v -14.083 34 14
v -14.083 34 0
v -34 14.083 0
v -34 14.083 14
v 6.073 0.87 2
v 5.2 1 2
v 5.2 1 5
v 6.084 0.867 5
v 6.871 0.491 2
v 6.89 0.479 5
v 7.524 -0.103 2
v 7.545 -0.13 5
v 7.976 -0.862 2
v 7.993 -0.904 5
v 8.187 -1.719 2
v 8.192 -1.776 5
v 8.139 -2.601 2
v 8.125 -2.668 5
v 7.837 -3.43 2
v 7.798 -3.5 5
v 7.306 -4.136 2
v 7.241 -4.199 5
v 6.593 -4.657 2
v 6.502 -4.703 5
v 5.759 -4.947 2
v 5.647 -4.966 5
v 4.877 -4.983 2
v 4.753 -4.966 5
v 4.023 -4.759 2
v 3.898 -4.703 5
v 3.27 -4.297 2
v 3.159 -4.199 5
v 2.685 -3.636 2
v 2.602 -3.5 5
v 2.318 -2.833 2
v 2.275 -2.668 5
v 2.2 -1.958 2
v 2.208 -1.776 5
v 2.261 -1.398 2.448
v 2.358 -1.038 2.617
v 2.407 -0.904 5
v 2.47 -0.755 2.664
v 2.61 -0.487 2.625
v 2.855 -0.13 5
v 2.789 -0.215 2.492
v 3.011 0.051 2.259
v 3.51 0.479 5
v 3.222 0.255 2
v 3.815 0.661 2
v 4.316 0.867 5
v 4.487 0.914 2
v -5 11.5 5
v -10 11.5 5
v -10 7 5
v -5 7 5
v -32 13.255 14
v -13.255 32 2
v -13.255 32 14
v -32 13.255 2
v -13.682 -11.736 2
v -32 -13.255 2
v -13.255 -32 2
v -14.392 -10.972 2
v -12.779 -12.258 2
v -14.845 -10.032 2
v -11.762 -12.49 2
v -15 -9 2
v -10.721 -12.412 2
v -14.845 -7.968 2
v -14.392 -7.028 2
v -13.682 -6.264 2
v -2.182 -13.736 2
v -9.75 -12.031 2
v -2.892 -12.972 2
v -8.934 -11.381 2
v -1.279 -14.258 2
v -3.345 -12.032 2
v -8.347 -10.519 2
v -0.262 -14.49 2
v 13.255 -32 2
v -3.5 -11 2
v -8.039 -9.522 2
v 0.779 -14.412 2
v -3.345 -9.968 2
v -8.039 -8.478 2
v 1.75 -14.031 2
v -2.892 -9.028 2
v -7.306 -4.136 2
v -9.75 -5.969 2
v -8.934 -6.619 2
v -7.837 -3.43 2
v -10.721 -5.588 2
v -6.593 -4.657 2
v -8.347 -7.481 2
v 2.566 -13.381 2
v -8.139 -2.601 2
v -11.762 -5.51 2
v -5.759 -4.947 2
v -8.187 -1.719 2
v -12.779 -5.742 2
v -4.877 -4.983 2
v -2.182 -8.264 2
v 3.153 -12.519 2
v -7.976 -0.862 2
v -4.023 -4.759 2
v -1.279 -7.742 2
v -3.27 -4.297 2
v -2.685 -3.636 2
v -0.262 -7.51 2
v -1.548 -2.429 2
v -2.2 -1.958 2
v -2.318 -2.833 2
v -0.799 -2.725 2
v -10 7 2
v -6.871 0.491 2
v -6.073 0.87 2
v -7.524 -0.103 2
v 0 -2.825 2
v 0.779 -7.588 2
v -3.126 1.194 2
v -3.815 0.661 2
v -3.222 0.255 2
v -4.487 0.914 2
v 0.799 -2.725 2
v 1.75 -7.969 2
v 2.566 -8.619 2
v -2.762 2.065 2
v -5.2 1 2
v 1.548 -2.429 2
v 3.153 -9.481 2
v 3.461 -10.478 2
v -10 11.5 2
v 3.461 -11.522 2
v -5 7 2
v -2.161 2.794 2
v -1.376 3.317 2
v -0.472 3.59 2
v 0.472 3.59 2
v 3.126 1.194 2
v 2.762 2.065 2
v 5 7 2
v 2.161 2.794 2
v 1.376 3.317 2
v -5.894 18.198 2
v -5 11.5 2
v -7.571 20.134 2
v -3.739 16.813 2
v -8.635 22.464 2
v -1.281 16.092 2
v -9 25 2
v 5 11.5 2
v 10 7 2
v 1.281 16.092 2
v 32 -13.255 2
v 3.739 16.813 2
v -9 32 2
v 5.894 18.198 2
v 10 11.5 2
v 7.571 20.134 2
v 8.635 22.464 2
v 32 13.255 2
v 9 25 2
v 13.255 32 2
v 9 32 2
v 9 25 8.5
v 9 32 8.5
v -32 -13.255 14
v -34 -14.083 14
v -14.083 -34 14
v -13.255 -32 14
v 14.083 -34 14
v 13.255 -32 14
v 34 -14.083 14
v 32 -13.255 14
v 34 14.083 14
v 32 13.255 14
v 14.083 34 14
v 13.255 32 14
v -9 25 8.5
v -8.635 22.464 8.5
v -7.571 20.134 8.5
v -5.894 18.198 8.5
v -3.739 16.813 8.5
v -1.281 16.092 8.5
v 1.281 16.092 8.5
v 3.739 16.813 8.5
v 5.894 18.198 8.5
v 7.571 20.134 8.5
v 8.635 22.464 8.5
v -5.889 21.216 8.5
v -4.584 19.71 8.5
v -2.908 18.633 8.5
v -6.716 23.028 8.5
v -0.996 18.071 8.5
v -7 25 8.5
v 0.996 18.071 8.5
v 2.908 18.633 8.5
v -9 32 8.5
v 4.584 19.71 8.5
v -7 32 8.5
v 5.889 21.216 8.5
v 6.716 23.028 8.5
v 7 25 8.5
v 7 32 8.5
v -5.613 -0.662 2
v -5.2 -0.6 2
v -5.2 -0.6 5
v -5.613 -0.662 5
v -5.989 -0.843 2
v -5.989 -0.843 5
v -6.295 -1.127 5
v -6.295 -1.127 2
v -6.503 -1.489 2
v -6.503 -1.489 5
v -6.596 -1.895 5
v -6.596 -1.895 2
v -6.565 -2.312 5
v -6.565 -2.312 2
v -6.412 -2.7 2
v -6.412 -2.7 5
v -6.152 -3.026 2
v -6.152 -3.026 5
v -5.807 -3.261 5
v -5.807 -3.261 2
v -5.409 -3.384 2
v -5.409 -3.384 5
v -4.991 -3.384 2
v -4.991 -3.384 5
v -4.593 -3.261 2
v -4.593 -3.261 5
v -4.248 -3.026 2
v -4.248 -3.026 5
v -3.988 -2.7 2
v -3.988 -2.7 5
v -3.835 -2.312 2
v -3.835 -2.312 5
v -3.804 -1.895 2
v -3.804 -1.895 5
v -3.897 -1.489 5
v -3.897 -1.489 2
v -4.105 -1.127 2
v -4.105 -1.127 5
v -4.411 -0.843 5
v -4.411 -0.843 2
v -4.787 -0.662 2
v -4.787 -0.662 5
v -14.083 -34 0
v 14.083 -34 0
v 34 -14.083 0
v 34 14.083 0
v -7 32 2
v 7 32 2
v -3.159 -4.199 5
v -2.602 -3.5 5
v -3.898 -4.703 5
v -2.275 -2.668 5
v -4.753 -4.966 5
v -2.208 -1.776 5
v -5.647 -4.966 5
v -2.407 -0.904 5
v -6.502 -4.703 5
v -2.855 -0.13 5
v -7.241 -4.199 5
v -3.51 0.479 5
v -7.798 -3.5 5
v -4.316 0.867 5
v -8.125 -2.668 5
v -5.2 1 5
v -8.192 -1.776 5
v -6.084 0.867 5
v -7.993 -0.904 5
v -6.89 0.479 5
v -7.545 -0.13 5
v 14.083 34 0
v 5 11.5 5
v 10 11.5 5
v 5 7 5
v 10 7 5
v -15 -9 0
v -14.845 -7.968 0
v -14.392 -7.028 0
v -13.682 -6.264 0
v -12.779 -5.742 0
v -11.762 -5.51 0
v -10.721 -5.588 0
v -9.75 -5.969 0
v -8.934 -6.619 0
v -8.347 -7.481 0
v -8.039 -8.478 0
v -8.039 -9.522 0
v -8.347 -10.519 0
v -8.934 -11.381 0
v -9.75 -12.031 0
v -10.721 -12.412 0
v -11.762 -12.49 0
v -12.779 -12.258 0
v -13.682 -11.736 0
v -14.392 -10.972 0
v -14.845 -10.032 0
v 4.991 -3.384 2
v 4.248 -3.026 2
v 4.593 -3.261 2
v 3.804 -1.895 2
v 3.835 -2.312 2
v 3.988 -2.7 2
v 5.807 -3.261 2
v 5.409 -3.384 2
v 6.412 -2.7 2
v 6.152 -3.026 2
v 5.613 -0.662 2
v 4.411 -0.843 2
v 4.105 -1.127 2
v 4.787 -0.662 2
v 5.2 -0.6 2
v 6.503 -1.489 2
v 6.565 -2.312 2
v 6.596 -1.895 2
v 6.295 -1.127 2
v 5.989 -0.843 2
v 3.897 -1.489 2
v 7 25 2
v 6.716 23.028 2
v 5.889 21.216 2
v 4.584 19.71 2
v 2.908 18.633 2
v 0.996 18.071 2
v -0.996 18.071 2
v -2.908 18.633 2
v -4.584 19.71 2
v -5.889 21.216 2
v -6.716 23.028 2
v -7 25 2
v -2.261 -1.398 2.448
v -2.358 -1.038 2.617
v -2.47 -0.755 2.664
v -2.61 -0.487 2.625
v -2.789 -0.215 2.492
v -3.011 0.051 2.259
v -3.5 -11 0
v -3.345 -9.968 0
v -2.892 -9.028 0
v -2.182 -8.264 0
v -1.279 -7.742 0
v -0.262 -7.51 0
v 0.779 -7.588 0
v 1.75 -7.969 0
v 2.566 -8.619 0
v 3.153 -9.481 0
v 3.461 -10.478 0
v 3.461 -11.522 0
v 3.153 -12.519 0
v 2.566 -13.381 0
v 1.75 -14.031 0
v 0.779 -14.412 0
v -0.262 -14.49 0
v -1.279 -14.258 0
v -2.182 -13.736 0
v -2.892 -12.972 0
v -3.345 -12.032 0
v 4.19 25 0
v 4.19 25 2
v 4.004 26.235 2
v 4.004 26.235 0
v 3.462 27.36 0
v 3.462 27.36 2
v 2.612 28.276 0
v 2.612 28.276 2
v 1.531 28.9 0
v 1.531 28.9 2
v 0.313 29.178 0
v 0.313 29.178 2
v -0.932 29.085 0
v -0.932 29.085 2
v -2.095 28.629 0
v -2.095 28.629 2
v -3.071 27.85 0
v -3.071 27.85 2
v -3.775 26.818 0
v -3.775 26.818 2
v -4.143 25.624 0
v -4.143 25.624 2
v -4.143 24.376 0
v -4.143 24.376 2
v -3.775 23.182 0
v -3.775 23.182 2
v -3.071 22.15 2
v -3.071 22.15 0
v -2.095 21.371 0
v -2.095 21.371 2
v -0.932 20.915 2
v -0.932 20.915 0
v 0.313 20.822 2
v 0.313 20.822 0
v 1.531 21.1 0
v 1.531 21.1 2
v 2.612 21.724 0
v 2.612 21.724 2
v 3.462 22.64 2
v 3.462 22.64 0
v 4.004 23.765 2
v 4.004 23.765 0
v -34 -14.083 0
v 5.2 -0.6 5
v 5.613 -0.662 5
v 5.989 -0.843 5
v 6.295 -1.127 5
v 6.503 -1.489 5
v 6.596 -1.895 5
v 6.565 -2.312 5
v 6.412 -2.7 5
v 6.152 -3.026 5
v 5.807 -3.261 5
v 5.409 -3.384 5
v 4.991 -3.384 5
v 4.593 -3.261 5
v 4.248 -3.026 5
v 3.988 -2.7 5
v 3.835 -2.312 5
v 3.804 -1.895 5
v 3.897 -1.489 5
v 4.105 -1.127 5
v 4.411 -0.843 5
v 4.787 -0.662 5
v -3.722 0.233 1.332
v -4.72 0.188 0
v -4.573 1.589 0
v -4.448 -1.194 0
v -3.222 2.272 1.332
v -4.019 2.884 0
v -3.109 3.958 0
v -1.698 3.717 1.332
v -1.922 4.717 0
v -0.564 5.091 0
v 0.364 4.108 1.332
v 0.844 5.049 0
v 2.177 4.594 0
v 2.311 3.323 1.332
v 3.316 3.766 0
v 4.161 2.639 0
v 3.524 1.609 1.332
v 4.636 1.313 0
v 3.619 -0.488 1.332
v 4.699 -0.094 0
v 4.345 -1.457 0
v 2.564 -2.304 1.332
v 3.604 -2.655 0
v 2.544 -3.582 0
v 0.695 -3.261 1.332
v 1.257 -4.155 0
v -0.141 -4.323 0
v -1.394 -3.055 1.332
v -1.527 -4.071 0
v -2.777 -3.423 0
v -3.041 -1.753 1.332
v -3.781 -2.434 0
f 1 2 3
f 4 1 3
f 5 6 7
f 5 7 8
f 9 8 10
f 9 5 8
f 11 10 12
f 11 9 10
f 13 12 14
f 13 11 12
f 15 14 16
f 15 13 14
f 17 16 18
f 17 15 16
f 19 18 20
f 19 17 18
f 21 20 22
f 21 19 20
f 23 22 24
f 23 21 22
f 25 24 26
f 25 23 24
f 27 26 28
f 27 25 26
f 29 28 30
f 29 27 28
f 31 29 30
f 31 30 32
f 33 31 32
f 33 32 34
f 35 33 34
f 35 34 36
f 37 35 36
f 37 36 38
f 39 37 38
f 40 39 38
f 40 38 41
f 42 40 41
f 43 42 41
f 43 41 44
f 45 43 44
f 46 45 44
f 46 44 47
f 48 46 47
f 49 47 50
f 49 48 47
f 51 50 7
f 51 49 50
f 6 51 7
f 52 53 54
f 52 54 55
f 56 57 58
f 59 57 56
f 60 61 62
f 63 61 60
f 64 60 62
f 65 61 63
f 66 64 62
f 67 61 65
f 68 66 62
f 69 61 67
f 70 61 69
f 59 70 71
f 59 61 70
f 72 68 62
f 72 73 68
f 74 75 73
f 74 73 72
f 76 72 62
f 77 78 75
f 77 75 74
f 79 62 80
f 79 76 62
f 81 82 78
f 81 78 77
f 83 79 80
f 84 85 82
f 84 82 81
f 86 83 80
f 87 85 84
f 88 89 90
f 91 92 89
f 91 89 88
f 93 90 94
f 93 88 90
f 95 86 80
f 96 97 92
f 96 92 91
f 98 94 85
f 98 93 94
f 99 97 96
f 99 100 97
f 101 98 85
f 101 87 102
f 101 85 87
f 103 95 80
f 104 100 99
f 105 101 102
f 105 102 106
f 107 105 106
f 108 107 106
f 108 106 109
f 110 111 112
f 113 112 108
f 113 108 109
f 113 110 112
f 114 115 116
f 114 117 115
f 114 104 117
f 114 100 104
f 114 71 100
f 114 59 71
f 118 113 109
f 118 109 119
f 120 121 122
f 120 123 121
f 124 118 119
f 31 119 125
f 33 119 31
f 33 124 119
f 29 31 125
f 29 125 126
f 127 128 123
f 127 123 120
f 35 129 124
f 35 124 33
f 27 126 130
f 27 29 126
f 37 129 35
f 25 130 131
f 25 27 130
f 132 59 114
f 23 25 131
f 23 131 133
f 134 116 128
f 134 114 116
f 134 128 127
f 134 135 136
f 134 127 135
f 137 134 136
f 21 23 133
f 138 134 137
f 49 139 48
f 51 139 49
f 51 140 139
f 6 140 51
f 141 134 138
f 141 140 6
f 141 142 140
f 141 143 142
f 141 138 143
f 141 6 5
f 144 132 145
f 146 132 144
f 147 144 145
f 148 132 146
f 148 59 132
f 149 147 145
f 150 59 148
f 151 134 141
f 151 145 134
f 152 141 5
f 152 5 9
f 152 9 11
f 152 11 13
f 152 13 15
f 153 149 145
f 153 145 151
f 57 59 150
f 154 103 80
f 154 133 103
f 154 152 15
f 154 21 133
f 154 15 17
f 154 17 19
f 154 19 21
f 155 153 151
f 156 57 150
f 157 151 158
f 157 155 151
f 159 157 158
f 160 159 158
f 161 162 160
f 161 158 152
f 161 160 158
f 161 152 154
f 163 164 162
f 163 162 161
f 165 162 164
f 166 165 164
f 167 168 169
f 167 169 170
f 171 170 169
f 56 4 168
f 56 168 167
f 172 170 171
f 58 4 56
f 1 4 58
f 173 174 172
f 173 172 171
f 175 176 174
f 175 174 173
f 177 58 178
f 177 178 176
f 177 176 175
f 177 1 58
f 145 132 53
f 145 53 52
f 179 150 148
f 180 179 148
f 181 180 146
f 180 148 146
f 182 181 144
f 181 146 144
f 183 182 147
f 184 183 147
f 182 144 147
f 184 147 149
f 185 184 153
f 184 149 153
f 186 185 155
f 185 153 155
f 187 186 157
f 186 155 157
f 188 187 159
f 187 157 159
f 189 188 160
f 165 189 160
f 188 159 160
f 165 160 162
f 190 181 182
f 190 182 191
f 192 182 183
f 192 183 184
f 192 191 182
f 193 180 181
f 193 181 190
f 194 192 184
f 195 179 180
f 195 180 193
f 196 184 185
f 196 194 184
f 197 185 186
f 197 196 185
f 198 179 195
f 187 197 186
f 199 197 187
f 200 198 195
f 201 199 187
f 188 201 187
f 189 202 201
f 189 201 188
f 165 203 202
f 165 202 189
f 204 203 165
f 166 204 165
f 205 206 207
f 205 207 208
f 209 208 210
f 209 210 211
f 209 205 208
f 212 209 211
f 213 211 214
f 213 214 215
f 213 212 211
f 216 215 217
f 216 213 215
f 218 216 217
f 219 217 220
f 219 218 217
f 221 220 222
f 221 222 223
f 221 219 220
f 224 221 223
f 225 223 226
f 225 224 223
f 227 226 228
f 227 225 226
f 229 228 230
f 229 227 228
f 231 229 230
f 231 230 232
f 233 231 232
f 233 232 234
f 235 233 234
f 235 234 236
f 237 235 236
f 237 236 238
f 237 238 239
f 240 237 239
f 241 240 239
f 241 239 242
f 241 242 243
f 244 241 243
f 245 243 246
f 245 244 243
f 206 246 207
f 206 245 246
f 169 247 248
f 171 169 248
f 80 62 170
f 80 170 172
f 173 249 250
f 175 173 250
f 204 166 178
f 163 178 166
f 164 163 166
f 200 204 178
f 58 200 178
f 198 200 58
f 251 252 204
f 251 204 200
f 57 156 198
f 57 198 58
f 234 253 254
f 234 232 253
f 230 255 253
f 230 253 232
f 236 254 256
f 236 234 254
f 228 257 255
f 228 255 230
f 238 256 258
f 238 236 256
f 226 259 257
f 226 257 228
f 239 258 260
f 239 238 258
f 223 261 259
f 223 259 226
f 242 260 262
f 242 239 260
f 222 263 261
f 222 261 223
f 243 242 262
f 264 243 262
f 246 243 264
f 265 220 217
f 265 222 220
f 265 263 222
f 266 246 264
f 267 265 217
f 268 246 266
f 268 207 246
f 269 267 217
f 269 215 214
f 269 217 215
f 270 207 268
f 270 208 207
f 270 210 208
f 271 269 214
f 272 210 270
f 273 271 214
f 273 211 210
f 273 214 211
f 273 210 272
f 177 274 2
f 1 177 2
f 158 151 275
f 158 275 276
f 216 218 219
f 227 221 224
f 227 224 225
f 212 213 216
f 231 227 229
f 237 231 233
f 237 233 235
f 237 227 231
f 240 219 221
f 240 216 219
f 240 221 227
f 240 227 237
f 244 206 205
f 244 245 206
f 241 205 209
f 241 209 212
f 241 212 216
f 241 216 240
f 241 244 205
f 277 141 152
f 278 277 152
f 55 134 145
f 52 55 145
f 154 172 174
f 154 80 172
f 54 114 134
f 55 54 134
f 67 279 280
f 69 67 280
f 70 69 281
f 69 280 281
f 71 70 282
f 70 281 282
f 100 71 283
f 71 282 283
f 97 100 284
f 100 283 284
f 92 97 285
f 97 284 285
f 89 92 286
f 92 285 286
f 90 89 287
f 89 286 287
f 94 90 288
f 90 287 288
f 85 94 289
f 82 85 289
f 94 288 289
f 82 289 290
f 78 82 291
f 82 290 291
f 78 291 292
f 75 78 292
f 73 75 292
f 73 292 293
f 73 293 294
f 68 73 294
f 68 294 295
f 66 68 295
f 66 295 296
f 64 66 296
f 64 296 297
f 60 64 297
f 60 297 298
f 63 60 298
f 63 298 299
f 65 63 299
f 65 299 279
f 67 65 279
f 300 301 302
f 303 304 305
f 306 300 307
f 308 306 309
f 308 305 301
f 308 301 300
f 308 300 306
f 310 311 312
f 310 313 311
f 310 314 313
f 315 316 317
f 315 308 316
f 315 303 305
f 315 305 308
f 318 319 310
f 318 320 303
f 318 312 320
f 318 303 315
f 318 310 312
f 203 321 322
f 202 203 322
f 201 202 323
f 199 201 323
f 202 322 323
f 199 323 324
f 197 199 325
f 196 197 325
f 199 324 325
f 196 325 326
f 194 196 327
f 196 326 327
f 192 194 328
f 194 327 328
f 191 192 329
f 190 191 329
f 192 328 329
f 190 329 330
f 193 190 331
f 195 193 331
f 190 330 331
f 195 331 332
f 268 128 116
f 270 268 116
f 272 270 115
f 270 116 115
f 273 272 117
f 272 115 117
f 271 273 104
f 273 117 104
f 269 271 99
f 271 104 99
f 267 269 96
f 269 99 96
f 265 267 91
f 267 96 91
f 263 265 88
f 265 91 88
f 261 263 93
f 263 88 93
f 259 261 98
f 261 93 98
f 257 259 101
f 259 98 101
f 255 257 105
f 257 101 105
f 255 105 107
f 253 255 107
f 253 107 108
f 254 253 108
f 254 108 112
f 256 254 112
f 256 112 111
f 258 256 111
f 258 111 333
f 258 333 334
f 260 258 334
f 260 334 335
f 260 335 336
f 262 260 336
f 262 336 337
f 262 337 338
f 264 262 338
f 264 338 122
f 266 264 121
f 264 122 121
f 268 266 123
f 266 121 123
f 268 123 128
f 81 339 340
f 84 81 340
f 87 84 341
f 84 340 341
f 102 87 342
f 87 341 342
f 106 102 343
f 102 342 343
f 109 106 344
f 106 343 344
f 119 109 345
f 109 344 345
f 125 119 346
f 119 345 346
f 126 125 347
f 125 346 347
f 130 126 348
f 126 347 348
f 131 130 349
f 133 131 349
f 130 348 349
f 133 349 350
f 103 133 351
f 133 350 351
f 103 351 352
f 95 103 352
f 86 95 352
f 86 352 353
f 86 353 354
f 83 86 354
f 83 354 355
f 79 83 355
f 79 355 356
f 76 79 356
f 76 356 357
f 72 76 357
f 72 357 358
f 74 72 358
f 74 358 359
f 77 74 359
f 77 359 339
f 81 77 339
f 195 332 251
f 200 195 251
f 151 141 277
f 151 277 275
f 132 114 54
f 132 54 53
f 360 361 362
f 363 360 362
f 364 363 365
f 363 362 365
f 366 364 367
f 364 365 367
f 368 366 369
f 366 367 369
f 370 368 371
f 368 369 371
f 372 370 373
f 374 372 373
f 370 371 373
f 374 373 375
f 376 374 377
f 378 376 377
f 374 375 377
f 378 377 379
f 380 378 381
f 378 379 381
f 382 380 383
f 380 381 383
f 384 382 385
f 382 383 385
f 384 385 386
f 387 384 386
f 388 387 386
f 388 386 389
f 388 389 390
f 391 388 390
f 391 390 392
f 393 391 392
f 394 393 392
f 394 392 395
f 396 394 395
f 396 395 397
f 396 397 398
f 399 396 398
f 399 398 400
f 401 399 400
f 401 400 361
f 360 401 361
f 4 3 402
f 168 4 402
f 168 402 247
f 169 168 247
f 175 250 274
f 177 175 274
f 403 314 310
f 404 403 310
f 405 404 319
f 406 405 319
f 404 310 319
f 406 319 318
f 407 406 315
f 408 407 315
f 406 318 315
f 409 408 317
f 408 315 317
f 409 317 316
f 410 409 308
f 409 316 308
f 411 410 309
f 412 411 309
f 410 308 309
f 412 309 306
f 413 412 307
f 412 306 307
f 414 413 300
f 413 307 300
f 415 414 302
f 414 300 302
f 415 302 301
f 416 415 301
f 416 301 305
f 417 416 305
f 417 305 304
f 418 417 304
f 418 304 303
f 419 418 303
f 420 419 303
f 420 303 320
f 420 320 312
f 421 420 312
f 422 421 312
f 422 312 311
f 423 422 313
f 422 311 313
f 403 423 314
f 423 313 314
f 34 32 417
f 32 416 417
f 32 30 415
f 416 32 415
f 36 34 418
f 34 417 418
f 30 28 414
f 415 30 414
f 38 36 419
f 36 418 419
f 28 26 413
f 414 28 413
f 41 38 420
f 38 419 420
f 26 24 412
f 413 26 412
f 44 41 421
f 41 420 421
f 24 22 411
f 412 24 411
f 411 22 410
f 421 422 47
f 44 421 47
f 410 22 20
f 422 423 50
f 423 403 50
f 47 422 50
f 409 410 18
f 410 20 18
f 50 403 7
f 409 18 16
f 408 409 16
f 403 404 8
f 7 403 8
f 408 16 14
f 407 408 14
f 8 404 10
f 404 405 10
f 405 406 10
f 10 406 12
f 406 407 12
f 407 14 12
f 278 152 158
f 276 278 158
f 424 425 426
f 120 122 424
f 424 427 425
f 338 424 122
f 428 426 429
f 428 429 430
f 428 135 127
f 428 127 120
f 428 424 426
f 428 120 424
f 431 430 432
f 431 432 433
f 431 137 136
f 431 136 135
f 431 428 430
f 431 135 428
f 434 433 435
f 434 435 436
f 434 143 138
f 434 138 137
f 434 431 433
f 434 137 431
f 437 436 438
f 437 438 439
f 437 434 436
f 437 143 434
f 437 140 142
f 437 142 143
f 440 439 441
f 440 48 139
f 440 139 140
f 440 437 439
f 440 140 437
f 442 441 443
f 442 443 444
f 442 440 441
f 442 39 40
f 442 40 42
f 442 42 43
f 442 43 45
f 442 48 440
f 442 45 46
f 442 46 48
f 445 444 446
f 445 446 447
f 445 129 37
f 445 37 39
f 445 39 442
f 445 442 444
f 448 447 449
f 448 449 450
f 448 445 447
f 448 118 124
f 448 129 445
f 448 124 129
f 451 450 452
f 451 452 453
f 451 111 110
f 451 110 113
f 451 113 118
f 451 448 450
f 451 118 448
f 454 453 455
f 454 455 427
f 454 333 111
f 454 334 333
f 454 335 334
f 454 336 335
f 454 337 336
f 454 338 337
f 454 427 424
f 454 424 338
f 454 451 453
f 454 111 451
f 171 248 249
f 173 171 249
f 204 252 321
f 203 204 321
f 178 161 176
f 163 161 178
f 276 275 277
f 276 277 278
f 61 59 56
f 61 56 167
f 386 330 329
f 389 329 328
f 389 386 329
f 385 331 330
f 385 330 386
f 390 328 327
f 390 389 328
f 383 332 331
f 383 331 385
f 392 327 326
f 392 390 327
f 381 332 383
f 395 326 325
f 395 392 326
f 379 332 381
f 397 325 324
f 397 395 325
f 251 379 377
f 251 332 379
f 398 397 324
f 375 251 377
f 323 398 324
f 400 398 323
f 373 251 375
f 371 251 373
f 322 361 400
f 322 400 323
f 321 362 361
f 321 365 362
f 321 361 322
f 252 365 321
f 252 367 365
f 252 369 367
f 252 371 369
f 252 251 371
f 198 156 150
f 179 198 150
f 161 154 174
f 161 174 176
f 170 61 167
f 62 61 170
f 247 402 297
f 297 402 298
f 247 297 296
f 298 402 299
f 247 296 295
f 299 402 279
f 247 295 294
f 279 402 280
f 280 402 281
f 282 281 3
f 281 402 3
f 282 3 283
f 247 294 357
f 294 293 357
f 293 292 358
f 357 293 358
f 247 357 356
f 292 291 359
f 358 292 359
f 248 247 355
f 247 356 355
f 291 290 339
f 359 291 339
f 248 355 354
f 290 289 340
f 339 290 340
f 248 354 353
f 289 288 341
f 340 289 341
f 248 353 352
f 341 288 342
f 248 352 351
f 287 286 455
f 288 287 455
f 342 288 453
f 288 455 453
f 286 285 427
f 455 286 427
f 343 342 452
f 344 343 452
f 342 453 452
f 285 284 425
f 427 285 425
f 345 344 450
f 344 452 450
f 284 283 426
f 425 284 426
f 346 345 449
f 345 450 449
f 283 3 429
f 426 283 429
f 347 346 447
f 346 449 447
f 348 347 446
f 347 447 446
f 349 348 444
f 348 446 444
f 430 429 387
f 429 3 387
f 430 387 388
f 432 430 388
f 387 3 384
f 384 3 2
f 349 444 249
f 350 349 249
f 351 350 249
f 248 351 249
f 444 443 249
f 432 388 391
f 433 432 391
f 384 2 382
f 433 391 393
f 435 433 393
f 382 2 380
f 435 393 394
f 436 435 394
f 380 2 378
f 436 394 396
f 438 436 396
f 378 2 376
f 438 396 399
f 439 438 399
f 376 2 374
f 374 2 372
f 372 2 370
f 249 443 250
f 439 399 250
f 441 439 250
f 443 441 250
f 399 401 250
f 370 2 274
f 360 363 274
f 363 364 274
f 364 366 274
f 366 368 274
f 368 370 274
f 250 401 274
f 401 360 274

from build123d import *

# Parameters (mm, degrees)
BOSS_EXTRUDE1_DEPTH = 14
SHELL1_T            = -2
BOSS_EXTRUDE2_DEPTH = 6.5
SKETCH3_R           = 4.19
CUT_EXTRUDE1_DEPTH  = 50.558046773
SKETCH8_R           = 3
SKETCH8_R_2         = 1.4
BOSS_EXTRUDE3_DEPTH = 3
SKETCH9_W           = 5
SKETCH9_H           = 4.5
BOSS_EXTRUDE4_DEPTH = 3
SKETCH10_R          = 3.5
CUT_EXTRUDE2_DEPTH  = 51.079936102


with BuildPart() as part:
    # Sketch1 → Boss-Extrude1 (new body)
    with BuildSketch(Plane.XY):
        Polygon((34, -14.083261121), (34, 14.083261121), (14.083261121, 34), (-14.083261121, 34), (-34, 14.083261121), (-34, -14.083261121), (-14.083261121, -34), (14.083261121, -34), align=None)
    extrude(amount=BOSS_EXTRUDE1_DEPTH)

    # Shell1
    shell1_openings = [part.faces().sort_by_distance(p)[0] for p in [
        (0, 0, 14),
    ]]
    offset(amount=SHELL1_T, openings=shell1_openings, kind=Kind.INTERSECTION)

    # Sketch2 → Boss-Extrude2 (add)
    with BuildSketch(Plane.XY.offset(2)):
        with BuildLine():
            Line((7, 32), (7, 25))
            ThreePointArc((7, 25), (0, 18), (-7, 25))
            Line((-7, 25), (-7, 32))
            Line((-7, 32), (-9, 32))
            Line((-9, 32), (-9, 25))
            ThreePointArc((-9, 25), (0, 16), (9, 25))
            Line((9, 25), (9, 32))
            Line((9, 32), (7, 32))
        make_face()
    extrude(amount=BOSS_EXTRUDE2_DEPTH)

    # Sketch3 → Cut-Extrude1 (cut, through all)
    with BuildSketch(Plane.XY.offset(2)):
        with Locations((0, 25)):
            Circle(SKETCH3_R)
    extrude(amount=-CUT_EXTRUDE1_DEPTH, mode=Mode.SUBTRACT)

    # Sketch8 → Boss-Extrude3 (add)
    with BuildSketch(Plane.XY.offset(2)):
        with Locations(Location((-5.2, -2, 0), (0, 0, 90))):
            Circle(SKETCH8_R)
        with Locations(Location((-5.2, -2, 0), (0, 0, 90))):
            Circle(SKETCH8_R_2, mode=Mode.SUBTRACT)
    boss_extrude3 = extrude(amount=BOSS_EXTRUDE3_DEPTH)

    # Mirror1: Boss-Extrude3 across plane
    add(boss_extrude3.mirror(Plane(origin=(0, 0, 0), x_dir=(0, 0, 1), z_dir=(1, 0, 0))))

    # Sketch6 → Cut-Revolve1 (revolve, cut)
    with BuildSketch(Plane(origin=(0, 0, 0), x_dir=(0, 0, -1), z_dir=(1, 0, 0)), mode=Mode.PRIVATE) as cut_revolve1_sk:
        Polygon((-6.3, 0.4), (0, 0.4), (0, -4.325), align=None)
    revolve(cut_revolve1_sk.sketch.rotate(Axis((0, 0.4, 6.3), (0, 0, -1)), 87.429020802), axis=Axis((0, 0.4, 6.3), (0, 0, -1)), mode=Mode.SUBTRACT)

    # Sketch9 → Boss-Extrude4 (add)
    with BuildSketch(Plane.XY.offset(2)):
        with Locations((-7.5, 9.25)):
            Rectangle(SKETCH9_W, SKETCH9_H)
        with Locations((7.5, 9.25)):
            Rectangle(SKETCH9_W, SKETCH9_H)
    extrude(amount=BOSS_EXTRUDE4_DEPTH)

    # Sketch10 → Cut-Extrude2 (cut, through all)
    with BuildSketch(Plane(origin=(0, 0, 0), x_dir=(-1, 0, 0), z_dir=(0, 0, -1))):
        with Locations((11.5, -9)):
            Circle(SKETCH10_R)
        with Locations((0, -11)):
            Circle(SKETCH10_R)
    extrude(amount=-CUT_EXTRUDE2_DEPTH, mode=Mode.SUBTRACT)


solid = part.part
